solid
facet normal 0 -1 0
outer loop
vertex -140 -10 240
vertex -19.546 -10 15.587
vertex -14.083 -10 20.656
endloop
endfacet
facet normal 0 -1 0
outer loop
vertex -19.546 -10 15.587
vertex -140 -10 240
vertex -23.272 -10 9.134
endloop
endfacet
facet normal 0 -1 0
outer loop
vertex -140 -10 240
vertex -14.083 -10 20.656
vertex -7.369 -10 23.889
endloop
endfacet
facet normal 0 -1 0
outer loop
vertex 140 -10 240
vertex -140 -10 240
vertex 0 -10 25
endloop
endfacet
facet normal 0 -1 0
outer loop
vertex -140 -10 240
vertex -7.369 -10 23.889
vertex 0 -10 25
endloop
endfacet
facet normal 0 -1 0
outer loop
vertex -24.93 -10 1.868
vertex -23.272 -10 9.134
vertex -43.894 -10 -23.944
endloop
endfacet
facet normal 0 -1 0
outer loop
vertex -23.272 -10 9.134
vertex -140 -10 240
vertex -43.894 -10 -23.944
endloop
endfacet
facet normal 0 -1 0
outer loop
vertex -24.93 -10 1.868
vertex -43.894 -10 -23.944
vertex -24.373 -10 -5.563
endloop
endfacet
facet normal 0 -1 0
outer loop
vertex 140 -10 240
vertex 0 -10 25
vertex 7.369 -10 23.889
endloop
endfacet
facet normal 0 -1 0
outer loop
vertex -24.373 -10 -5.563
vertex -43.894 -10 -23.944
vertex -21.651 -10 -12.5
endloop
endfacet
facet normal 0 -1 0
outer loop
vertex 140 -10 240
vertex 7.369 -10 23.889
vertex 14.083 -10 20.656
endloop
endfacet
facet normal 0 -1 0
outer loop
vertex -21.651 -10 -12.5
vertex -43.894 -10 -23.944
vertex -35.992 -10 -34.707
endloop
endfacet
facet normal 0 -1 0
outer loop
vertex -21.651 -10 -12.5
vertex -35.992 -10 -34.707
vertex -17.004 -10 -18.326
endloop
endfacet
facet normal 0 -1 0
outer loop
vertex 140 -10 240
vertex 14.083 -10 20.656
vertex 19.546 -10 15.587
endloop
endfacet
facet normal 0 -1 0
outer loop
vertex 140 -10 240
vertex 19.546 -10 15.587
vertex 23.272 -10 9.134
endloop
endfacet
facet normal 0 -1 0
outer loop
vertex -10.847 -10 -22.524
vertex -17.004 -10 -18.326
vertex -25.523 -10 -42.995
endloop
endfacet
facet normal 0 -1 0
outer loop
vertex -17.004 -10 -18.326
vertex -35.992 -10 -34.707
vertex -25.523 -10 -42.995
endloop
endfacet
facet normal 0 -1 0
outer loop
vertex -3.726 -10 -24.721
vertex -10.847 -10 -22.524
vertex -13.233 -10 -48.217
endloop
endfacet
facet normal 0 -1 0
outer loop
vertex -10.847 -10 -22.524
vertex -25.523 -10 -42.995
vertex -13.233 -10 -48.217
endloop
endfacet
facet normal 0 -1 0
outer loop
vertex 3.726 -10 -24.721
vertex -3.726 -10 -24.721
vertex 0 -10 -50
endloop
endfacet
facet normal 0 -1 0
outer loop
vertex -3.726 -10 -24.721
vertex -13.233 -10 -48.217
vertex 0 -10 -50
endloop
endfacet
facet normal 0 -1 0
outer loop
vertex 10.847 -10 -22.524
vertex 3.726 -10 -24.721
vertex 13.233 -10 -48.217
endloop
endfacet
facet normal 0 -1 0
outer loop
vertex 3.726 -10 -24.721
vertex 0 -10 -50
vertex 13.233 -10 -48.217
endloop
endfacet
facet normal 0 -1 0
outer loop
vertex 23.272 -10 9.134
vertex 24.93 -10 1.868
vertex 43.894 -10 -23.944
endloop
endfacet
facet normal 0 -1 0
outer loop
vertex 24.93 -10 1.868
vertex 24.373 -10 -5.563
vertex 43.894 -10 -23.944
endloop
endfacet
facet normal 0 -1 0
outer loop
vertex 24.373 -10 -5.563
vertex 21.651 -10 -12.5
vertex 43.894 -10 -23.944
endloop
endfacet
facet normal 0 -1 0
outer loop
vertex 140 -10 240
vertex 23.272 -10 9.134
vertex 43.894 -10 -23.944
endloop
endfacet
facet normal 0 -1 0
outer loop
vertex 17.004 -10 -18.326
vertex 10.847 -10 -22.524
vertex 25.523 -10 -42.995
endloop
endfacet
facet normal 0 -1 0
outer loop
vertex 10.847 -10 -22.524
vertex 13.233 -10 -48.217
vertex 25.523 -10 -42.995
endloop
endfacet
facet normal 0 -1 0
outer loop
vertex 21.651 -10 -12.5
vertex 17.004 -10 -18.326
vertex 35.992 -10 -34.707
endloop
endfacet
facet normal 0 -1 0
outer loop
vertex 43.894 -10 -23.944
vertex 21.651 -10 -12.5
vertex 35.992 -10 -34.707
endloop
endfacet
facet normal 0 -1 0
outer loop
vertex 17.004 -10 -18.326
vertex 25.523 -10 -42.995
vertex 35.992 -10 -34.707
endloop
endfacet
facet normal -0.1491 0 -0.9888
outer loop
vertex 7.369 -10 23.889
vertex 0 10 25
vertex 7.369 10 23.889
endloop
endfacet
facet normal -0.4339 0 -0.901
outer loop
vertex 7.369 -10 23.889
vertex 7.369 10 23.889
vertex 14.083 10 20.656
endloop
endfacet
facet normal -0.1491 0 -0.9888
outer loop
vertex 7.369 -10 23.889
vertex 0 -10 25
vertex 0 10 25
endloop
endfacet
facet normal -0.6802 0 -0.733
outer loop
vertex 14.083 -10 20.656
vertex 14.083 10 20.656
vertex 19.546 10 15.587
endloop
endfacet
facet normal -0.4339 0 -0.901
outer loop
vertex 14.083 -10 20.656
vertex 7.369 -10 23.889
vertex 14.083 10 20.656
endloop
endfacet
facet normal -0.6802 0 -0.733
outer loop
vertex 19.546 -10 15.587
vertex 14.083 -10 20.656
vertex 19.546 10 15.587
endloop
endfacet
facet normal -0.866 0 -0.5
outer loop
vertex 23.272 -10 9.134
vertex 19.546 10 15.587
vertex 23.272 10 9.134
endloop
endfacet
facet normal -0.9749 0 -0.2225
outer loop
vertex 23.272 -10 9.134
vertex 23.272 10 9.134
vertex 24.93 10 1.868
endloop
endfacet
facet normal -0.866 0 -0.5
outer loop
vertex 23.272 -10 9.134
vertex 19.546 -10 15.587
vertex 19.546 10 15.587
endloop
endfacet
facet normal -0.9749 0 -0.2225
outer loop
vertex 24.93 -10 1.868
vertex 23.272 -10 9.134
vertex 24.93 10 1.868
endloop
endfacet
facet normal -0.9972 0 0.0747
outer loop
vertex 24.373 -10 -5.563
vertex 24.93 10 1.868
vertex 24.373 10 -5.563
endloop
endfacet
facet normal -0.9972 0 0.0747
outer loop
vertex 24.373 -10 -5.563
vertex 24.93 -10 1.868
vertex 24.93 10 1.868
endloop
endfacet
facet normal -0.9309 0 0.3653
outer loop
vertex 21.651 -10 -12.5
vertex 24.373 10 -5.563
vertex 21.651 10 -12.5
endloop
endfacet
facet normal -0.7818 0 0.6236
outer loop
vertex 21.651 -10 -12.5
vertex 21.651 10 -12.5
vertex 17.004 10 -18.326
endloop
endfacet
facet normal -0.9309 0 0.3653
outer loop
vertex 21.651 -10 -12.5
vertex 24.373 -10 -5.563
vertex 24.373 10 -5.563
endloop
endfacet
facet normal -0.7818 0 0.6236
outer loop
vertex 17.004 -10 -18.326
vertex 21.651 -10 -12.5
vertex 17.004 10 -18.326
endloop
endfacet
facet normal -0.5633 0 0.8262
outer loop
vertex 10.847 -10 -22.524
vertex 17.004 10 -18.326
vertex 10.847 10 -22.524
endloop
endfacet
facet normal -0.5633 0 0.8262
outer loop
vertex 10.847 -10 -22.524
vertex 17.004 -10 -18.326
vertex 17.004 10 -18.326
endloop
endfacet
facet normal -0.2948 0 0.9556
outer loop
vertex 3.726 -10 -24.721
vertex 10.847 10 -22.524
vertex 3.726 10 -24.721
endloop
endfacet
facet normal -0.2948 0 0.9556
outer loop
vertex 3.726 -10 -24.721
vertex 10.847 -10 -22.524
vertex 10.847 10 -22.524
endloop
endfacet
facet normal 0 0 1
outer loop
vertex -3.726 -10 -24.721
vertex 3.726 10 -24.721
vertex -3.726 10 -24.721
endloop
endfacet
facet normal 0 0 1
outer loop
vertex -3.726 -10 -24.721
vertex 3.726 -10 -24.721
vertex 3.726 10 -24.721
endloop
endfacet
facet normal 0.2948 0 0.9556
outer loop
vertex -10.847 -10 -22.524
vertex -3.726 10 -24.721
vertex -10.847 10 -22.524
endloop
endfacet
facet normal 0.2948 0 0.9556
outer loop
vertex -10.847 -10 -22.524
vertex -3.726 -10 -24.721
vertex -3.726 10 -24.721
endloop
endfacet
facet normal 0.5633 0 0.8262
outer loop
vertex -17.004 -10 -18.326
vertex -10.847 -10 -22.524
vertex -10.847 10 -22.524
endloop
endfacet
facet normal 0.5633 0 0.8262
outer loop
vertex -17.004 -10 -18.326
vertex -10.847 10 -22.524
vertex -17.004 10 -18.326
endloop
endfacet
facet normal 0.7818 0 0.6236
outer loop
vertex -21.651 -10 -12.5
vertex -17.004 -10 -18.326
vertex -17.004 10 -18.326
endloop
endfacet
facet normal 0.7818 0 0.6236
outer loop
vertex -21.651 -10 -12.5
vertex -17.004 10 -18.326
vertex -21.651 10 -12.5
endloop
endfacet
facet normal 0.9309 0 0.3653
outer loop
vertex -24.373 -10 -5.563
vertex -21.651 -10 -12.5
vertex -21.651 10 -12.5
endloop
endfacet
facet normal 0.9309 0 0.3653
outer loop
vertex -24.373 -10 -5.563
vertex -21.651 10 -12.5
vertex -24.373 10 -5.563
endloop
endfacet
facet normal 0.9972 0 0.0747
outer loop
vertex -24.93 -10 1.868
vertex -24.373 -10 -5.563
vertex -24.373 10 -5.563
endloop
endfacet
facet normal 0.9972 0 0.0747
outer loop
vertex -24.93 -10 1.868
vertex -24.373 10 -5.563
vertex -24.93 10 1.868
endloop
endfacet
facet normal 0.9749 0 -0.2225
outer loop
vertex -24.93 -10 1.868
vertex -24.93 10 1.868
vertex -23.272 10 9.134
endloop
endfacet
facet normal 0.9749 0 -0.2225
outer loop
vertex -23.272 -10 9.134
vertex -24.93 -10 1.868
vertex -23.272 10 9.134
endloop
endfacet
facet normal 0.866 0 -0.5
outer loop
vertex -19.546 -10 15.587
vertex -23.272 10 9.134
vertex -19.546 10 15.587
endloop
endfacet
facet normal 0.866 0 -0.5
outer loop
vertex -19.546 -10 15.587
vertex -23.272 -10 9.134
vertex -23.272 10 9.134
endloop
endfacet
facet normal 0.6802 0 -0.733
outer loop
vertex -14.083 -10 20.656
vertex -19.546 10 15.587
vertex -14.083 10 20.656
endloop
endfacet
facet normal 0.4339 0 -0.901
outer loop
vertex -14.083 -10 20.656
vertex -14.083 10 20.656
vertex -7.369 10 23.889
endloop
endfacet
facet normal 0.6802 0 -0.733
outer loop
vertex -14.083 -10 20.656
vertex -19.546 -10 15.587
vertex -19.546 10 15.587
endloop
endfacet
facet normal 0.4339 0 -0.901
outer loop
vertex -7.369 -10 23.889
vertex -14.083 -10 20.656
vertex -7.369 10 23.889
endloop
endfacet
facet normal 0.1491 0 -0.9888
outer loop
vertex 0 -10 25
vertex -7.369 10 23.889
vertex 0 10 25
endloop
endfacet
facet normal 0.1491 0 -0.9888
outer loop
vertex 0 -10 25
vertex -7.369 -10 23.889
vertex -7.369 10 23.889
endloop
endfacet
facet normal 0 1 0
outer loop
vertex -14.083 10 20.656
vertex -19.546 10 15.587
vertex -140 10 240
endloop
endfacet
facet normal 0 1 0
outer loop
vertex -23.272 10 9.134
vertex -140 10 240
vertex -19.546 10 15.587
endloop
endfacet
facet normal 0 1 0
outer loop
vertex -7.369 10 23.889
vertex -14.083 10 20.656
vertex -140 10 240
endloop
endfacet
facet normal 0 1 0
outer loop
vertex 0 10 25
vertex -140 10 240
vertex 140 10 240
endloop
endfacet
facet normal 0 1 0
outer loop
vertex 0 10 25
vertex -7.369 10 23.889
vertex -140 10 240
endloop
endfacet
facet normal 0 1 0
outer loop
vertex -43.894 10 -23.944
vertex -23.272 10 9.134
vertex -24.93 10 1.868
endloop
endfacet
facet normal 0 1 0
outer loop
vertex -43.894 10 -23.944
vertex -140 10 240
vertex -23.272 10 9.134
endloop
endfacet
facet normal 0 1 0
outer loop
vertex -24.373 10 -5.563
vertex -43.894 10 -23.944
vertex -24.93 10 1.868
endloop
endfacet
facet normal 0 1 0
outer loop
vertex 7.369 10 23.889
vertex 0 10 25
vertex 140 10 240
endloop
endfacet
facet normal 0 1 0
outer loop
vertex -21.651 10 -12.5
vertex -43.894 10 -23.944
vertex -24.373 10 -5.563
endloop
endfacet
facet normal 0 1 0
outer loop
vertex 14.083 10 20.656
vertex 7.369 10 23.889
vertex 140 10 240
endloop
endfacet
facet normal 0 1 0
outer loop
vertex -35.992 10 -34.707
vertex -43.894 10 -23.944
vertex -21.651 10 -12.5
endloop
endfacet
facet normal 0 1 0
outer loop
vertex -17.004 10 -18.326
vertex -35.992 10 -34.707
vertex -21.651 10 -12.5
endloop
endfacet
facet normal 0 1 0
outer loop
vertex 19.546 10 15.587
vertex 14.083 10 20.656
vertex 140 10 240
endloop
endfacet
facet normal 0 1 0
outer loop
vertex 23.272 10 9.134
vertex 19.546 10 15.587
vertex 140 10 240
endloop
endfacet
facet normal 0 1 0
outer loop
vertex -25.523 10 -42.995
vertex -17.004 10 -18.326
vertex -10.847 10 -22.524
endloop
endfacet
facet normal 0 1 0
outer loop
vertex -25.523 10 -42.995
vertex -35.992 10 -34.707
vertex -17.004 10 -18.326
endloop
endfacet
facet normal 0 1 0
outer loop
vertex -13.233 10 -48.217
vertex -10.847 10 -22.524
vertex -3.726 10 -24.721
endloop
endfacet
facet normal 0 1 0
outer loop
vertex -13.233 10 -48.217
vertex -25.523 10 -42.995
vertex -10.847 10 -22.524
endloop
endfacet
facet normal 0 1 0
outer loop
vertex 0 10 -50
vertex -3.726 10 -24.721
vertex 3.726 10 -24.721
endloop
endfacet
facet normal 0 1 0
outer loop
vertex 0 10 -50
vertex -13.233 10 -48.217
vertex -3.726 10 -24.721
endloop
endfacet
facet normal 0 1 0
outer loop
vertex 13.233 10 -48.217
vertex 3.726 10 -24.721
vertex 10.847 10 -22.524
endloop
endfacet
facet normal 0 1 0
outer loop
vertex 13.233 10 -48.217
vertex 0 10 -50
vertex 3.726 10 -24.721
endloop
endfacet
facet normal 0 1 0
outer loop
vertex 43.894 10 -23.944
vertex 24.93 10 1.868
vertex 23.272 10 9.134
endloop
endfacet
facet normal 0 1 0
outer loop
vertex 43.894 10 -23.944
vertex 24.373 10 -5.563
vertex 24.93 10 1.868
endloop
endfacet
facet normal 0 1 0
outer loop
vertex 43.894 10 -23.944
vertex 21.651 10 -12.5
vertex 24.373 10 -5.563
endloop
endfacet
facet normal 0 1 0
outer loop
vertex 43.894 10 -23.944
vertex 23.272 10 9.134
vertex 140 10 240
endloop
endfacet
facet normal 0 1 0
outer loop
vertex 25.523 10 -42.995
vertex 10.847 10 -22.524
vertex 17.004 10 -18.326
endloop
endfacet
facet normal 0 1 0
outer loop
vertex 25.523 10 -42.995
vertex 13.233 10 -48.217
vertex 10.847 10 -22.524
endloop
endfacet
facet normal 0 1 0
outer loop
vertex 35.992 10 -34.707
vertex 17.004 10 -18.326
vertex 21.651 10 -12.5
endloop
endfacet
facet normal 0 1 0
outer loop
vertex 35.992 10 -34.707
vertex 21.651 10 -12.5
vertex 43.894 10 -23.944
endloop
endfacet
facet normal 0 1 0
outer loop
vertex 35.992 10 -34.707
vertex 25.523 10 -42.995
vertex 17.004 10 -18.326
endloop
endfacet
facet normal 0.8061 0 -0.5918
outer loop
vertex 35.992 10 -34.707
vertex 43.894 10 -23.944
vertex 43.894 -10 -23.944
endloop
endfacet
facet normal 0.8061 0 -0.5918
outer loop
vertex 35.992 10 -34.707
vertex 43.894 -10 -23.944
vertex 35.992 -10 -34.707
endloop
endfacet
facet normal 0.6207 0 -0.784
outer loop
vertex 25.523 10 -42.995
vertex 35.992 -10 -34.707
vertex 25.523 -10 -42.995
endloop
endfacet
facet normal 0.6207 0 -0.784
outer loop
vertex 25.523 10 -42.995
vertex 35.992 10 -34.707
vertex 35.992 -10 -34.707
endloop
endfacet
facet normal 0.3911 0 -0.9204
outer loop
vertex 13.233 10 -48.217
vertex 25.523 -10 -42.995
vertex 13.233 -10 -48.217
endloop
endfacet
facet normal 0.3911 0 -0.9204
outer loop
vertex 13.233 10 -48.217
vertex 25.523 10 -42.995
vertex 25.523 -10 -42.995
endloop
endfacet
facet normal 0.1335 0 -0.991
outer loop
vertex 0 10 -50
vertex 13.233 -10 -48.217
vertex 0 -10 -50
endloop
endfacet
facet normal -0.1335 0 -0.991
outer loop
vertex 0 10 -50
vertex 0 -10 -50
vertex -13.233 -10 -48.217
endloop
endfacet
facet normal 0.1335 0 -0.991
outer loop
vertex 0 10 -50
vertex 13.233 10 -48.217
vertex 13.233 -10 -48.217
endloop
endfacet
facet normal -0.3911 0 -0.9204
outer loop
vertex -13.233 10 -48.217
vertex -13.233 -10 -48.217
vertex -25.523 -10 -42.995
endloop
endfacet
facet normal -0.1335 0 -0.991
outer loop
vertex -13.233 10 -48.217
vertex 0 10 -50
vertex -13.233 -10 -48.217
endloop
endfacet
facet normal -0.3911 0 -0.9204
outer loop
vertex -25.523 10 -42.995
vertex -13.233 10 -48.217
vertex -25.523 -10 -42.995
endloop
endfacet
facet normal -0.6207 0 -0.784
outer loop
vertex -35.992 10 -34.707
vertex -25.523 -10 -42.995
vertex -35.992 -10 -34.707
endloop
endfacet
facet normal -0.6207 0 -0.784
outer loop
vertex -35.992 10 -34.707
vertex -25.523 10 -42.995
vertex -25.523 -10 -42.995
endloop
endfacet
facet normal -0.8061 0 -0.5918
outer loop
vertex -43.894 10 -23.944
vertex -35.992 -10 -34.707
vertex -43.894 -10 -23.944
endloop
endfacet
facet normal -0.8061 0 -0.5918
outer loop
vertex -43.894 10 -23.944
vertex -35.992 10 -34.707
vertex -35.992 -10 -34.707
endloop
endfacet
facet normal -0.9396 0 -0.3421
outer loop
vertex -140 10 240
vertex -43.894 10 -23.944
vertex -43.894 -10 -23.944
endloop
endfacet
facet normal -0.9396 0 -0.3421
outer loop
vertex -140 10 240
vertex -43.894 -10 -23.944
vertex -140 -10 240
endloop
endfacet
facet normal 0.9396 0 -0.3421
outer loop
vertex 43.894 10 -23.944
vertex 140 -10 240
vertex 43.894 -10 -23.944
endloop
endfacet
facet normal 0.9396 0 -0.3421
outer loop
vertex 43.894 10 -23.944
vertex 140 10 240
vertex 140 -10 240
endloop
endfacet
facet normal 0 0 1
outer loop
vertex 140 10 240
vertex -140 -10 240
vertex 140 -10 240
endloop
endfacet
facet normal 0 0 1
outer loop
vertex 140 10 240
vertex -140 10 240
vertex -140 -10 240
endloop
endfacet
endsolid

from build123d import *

# Parameters (mm, degrees)
SKETCH9_R           = 25
BOSS_EXTRUDE7_DEPTH = 10


with BuildPart() as part:
    # Sketch9 → Boss-Extrude7 (new, symmetric)
    with BuildSketch(Plane(origin=(0, 0, 0), x_dir=(1, 0, 0), z_dir=(0, 1, 0))):
        with BuildLine():
            Line((0, -240), (140, -240))
            Line((140, -240), (43.894055239, 23.943932732))
            ThreePointArc((43.894055239, 23.943932732), (0, 50), (-43.894055239, 23.943932732))
            Line((-43.894055239, 23.943932732), (-140, -240))
            Line((-140, -240), (0, -240))
        make_face()
        with Locations(Location((0, 0, 0), (0, 0, 270))):
            Circle(SKETCH9_R, mode=Mode.SUBTRACT)
    extrude(amount=BOSS_EXTRUDE7_DEPTH, both=True)


solid = part.part
